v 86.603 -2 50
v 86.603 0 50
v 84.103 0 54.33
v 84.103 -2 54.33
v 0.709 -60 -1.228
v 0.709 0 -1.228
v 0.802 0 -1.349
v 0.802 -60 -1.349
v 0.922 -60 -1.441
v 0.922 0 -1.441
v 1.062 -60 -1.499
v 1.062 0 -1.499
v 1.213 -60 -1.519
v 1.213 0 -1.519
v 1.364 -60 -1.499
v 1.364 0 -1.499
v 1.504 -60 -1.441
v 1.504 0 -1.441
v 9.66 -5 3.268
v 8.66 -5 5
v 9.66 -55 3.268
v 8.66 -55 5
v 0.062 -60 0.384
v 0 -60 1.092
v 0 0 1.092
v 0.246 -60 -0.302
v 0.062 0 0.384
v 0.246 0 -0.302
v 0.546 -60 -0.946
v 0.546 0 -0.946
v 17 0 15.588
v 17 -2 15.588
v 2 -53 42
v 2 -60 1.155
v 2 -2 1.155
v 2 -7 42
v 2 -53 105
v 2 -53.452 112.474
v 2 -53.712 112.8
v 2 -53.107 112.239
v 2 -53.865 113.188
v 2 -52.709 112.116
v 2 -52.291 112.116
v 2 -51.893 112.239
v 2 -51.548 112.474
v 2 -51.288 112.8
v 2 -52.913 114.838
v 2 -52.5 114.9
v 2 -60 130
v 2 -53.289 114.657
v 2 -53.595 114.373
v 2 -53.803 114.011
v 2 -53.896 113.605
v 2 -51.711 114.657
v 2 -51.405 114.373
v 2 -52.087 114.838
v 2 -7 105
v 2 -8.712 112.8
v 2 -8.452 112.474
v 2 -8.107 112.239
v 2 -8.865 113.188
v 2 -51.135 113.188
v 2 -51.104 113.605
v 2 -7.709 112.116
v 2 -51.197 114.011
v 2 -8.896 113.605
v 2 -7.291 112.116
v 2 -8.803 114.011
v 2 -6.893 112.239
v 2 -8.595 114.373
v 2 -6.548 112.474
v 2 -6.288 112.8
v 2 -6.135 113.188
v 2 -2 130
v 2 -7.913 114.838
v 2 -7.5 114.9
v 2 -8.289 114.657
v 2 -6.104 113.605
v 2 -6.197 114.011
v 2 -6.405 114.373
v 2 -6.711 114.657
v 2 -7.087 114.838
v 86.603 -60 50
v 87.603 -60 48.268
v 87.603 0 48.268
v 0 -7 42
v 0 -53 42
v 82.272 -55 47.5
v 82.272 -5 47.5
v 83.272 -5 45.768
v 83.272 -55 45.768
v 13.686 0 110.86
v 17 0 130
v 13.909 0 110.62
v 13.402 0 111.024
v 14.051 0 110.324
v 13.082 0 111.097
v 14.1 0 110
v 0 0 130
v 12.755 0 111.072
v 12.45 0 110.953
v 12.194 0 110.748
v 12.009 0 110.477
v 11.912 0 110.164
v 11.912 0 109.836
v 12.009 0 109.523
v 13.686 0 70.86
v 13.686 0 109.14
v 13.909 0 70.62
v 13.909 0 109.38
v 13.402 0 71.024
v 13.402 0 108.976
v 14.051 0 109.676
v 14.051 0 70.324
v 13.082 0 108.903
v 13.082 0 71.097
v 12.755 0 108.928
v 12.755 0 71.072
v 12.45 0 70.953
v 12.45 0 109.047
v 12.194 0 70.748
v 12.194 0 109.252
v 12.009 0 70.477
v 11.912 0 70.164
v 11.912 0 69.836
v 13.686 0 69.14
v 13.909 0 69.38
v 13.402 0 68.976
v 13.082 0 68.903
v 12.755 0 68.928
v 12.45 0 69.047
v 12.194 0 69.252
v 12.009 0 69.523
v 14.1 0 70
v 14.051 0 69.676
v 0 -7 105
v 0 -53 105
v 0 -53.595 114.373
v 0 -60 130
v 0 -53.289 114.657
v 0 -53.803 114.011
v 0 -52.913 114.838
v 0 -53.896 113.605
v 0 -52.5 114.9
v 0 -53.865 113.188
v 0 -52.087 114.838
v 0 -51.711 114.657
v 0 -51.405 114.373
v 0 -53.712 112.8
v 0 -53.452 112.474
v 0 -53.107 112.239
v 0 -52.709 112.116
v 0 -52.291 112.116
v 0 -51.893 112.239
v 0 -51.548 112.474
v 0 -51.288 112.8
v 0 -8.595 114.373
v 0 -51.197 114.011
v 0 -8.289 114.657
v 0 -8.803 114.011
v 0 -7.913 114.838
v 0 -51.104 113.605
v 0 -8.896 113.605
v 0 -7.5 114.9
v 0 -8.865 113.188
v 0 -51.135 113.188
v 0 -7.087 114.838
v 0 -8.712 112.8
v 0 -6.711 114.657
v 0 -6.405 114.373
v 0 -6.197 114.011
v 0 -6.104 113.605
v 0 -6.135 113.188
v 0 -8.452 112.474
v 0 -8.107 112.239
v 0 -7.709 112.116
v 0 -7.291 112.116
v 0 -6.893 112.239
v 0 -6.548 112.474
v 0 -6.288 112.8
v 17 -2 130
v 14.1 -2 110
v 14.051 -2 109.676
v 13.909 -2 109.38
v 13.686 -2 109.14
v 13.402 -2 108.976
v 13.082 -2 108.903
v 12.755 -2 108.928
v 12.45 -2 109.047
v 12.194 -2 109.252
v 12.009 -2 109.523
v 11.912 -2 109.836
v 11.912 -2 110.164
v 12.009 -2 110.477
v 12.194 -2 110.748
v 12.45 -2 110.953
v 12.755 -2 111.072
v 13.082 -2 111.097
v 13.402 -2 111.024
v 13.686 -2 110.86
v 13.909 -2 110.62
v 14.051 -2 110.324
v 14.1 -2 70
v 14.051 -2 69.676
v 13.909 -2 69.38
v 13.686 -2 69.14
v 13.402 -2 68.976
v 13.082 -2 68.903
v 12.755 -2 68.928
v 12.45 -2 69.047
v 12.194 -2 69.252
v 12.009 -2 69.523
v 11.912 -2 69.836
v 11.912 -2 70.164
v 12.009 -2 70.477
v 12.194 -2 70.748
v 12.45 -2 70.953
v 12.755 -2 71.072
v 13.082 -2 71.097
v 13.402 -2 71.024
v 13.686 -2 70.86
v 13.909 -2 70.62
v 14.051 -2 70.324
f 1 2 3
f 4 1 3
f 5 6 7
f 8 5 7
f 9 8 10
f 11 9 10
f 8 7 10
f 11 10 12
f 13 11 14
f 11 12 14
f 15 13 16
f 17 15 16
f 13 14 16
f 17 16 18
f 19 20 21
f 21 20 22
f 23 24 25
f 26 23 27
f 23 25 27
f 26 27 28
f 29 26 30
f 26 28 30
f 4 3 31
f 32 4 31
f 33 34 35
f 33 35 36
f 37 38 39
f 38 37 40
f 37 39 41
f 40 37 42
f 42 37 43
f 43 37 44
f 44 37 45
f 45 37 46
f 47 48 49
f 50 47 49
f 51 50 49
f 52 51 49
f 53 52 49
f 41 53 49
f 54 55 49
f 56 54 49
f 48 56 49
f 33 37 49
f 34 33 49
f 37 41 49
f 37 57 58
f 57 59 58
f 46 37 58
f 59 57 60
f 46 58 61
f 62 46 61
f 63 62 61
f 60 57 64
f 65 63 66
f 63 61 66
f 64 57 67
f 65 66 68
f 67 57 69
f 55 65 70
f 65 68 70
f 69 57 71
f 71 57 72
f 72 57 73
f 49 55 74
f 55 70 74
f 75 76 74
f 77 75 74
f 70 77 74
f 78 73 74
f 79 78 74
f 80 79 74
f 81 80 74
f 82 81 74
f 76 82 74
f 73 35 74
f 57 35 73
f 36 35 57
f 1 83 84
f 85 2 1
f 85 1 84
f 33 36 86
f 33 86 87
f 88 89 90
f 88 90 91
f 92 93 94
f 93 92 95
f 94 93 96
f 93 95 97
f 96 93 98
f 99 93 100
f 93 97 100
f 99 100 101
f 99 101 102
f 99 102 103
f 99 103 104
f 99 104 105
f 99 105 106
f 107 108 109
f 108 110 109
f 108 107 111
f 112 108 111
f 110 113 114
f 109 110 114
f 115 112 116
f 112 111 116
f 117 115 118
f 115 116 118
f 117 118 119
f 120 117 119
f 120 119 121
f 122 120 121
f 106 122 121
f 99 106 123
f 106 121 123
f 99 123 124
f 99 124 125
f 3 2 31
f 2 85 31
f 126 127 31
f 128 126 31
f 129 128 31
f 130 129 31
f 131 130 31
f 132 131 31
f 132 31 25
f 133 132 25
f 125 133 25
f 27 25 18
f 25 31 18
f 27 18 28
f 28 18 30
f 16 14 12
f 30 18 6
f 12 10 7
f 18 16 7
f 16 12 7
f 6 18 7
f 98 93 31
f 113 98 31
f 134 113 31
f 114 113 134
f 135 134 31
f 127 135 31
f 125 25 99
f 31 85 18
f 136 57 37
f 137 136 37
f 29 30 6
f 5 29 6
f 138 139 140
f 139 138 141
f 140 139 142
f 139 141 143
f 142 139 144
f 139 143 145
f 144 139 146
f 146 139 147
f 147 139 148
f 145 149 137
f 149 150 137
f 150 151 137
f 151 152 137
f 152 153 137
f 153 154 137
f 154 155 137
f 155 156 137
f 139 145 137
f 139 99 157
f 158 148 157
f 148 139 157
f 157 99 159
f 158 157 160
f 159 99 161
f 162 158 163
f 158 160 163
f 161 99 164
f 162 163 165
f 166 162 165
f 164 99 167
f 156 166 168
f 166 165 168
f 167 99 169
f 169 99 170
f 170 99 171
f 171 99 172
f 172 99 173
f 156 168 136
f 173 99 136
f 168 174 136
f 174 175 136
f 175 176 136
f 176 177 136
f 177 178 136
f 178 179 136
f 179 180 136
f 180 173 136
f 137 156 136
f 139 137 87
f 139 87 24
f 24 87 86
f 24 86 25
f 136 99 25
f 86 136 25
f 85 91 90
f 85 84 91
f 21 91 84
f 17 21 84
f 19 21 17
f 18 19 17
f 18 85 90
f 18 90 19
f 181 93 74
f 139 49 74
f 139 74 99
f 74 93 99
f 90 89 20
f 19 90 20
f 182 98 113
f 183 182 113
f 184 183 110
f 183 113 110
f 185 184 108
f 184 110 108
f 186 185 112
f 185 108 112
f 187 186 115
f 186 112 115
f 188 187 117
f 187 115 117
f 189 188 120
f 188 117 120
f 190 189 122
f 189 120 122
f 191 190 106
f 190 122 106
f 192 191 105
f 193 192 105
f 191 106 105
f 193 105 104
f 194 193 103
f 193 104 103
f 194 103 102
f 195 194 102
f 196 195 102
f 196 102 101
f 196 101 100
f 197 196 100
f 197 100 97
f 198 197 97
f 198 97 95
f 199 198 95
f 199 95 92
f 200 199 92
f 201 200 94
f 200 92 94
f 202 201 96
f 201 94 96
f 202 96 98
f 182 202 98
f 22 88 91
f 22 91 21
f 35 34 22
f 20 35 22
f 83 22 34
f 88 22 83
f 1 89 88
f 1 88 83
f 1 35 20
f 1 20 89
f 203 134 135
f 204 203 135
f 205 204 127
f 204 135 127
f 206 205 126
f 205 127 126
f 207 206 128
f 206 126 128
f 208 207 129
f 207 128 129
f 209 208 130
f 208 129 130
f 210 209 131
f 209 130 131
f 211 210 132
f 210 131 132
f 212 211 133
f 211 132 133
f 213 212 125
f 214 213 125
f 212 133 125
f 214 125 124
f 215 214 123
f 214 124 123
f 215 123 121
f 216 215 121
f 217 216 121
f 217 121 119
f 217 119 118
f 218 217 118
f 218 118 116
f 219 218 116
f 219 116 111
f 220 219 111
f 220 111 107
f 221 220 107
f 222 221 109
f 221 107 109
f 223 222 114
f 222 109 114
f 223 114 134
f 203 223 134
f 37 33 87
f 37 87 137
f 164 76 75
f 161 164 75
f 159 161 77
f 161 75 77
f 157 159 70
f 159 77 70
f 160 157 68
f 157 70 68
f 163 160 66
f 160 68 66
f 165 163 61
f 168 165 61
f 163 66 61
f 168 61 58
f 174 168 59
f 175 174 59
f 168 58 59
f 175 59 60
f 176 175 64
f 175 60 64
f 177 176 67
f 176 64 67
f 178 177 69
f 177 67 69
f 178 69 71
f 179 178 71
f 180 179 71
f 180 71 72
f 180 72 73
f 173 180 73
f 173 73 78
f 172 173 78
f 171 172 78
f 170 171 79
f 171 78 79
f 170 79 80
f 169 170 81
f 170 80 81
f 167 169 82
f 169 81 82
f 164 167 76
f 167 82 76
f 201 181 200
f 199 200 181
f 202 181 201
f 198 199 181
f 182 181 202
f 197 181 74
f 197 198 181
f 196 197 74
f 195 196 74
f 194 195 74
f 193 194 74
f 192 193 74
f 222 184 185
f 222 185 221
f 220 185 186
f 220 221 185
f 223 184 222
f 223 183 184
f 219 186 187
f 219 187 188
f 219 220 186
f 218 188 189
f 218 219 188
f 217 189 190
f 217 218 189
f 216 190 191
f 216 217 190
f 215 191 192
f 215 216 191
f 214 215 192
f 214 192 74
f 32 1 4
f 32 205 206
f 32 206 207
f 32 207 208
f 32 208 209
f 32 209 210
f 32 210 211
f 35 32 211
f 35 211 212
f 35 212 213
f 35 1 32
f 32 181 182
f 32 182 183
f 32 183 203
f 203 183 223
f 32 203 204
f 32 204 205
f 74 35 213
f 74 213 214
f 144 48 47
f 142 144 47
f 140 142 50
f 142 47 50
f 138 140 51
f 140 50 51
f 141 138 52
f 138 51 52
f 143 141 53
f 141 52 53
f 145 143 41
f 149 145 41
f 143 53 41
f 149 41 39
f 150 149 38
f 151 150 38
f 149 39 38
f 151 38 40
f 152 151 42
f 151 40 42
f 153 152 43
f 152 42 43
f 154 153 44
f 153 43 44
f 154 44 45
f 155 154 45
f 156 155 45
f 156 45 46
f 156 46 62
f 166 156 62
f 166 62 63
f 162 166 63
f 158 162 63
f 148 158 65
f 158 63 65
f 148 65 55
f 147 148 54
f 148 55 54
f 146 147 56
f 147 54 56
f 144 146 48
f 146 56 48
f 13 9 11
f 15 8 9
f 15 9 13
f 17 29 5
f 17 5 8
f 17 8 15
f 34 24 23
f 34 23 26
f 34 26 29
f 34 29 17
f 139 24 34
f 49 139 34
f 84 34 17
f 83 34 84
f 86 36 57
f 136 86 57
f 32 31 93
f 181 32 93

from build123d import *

# Parameters (mm, degrees)
PAD_DEPTH       = 60
SKETCH001_R     = 1.4
SKETCH001_W     = 63
SKETCH001_H     = 46
POCKET_DEPTH    = 2
SKETCH002_W     = 85
SKETCH002_H     = 50
POCKET001_DEPTH = 2.1
SKETCH003_R     = 1.1
PAD001_DEPTH    = 2


with BuildPart() as part:
    # Sketch → Pad (new body)
    with BuildSketch(Plane.XZ):
        with BuildLine():
            Line((2, 130), (0, 130))
            Line((0, 130), (0, 1.092096))
            ThreePointArc((0, 1.092096), (0.138878, 0.037212), (0.546048, -0.945783))
            Line((0.546048, -0.945783), (0.709176, -1.228329))
            ThreePointArc((0.709176, -1.228329), (1.06244, -1.499398), (1.50391, -1.441277))
            Line((87.60254, 48.267949), (1.50391, -1.441277))
            Line((86.60254, 50), (87.60254, 48.267949))
            Line((2, 1.154701), (86.60254, 50))
            Line((2, 1.154701), (2, 130))
        make_face()
    extrude(amount=PAD_DEPTH)

    # Sketch001 (on Face3 of Pad) → Pocket (cut)
    with BuildSketch(Plane(origin=(2, 0, 0), x_dir=(0, 0, 1), z_dir=(1, 0, 0))):
        with Locations((113.5, 52.5)):
            Circle(SKETCH001_R)
        with Locations((113.5, 7.5)):
            Circle(SKETCH001_R)
        with Locations((73.5, 30)):
            Rectangle(SKETCH001_W, SKETCH001_H)
    extrude(amount=-POCKET_DEPTH, mode=Mode.SUBTRACT)

    # Sketch002 (on Face2 of Pocket) → Pocket001 (cut)
    with BuildSketch(Plane(origin=(0, 0, 0), x_dir=(-0.866025, 0, -0.5), z_dir=(-0.5, 0, 0.866025))):
        with Locations((-52.5, 30)):
            Rectangle(SKETCH002_W, SKETCH002_H)
    extrude(amount=-POCKET001_DEPTH, mode=Mode.SUBTRACT)

    # Sketch003 (on Face4 of Pocket001) → Pad001 (join)
    with BuildSketch(Plane(origin=(0, 0, 0), x_dir=(1, 0, 0), z_dir=(0, 1, 0))):
        Polygon((2, -1.154701), (86.60254, -50), (84.10254, -54.330127), (17, -15.588457), (17, -130), (2, -130), align=None)
        with Locations((13, -110)):
            Circle(SKETCH003_R, mode=Mode.SUBTRACT)
        with Locations((13, -70)):
            Circle(SKETCH003_R, mode=Mode.SUBTRACT)
    extrude(amount=-PAD001_DEPTH)


solid = part.part
